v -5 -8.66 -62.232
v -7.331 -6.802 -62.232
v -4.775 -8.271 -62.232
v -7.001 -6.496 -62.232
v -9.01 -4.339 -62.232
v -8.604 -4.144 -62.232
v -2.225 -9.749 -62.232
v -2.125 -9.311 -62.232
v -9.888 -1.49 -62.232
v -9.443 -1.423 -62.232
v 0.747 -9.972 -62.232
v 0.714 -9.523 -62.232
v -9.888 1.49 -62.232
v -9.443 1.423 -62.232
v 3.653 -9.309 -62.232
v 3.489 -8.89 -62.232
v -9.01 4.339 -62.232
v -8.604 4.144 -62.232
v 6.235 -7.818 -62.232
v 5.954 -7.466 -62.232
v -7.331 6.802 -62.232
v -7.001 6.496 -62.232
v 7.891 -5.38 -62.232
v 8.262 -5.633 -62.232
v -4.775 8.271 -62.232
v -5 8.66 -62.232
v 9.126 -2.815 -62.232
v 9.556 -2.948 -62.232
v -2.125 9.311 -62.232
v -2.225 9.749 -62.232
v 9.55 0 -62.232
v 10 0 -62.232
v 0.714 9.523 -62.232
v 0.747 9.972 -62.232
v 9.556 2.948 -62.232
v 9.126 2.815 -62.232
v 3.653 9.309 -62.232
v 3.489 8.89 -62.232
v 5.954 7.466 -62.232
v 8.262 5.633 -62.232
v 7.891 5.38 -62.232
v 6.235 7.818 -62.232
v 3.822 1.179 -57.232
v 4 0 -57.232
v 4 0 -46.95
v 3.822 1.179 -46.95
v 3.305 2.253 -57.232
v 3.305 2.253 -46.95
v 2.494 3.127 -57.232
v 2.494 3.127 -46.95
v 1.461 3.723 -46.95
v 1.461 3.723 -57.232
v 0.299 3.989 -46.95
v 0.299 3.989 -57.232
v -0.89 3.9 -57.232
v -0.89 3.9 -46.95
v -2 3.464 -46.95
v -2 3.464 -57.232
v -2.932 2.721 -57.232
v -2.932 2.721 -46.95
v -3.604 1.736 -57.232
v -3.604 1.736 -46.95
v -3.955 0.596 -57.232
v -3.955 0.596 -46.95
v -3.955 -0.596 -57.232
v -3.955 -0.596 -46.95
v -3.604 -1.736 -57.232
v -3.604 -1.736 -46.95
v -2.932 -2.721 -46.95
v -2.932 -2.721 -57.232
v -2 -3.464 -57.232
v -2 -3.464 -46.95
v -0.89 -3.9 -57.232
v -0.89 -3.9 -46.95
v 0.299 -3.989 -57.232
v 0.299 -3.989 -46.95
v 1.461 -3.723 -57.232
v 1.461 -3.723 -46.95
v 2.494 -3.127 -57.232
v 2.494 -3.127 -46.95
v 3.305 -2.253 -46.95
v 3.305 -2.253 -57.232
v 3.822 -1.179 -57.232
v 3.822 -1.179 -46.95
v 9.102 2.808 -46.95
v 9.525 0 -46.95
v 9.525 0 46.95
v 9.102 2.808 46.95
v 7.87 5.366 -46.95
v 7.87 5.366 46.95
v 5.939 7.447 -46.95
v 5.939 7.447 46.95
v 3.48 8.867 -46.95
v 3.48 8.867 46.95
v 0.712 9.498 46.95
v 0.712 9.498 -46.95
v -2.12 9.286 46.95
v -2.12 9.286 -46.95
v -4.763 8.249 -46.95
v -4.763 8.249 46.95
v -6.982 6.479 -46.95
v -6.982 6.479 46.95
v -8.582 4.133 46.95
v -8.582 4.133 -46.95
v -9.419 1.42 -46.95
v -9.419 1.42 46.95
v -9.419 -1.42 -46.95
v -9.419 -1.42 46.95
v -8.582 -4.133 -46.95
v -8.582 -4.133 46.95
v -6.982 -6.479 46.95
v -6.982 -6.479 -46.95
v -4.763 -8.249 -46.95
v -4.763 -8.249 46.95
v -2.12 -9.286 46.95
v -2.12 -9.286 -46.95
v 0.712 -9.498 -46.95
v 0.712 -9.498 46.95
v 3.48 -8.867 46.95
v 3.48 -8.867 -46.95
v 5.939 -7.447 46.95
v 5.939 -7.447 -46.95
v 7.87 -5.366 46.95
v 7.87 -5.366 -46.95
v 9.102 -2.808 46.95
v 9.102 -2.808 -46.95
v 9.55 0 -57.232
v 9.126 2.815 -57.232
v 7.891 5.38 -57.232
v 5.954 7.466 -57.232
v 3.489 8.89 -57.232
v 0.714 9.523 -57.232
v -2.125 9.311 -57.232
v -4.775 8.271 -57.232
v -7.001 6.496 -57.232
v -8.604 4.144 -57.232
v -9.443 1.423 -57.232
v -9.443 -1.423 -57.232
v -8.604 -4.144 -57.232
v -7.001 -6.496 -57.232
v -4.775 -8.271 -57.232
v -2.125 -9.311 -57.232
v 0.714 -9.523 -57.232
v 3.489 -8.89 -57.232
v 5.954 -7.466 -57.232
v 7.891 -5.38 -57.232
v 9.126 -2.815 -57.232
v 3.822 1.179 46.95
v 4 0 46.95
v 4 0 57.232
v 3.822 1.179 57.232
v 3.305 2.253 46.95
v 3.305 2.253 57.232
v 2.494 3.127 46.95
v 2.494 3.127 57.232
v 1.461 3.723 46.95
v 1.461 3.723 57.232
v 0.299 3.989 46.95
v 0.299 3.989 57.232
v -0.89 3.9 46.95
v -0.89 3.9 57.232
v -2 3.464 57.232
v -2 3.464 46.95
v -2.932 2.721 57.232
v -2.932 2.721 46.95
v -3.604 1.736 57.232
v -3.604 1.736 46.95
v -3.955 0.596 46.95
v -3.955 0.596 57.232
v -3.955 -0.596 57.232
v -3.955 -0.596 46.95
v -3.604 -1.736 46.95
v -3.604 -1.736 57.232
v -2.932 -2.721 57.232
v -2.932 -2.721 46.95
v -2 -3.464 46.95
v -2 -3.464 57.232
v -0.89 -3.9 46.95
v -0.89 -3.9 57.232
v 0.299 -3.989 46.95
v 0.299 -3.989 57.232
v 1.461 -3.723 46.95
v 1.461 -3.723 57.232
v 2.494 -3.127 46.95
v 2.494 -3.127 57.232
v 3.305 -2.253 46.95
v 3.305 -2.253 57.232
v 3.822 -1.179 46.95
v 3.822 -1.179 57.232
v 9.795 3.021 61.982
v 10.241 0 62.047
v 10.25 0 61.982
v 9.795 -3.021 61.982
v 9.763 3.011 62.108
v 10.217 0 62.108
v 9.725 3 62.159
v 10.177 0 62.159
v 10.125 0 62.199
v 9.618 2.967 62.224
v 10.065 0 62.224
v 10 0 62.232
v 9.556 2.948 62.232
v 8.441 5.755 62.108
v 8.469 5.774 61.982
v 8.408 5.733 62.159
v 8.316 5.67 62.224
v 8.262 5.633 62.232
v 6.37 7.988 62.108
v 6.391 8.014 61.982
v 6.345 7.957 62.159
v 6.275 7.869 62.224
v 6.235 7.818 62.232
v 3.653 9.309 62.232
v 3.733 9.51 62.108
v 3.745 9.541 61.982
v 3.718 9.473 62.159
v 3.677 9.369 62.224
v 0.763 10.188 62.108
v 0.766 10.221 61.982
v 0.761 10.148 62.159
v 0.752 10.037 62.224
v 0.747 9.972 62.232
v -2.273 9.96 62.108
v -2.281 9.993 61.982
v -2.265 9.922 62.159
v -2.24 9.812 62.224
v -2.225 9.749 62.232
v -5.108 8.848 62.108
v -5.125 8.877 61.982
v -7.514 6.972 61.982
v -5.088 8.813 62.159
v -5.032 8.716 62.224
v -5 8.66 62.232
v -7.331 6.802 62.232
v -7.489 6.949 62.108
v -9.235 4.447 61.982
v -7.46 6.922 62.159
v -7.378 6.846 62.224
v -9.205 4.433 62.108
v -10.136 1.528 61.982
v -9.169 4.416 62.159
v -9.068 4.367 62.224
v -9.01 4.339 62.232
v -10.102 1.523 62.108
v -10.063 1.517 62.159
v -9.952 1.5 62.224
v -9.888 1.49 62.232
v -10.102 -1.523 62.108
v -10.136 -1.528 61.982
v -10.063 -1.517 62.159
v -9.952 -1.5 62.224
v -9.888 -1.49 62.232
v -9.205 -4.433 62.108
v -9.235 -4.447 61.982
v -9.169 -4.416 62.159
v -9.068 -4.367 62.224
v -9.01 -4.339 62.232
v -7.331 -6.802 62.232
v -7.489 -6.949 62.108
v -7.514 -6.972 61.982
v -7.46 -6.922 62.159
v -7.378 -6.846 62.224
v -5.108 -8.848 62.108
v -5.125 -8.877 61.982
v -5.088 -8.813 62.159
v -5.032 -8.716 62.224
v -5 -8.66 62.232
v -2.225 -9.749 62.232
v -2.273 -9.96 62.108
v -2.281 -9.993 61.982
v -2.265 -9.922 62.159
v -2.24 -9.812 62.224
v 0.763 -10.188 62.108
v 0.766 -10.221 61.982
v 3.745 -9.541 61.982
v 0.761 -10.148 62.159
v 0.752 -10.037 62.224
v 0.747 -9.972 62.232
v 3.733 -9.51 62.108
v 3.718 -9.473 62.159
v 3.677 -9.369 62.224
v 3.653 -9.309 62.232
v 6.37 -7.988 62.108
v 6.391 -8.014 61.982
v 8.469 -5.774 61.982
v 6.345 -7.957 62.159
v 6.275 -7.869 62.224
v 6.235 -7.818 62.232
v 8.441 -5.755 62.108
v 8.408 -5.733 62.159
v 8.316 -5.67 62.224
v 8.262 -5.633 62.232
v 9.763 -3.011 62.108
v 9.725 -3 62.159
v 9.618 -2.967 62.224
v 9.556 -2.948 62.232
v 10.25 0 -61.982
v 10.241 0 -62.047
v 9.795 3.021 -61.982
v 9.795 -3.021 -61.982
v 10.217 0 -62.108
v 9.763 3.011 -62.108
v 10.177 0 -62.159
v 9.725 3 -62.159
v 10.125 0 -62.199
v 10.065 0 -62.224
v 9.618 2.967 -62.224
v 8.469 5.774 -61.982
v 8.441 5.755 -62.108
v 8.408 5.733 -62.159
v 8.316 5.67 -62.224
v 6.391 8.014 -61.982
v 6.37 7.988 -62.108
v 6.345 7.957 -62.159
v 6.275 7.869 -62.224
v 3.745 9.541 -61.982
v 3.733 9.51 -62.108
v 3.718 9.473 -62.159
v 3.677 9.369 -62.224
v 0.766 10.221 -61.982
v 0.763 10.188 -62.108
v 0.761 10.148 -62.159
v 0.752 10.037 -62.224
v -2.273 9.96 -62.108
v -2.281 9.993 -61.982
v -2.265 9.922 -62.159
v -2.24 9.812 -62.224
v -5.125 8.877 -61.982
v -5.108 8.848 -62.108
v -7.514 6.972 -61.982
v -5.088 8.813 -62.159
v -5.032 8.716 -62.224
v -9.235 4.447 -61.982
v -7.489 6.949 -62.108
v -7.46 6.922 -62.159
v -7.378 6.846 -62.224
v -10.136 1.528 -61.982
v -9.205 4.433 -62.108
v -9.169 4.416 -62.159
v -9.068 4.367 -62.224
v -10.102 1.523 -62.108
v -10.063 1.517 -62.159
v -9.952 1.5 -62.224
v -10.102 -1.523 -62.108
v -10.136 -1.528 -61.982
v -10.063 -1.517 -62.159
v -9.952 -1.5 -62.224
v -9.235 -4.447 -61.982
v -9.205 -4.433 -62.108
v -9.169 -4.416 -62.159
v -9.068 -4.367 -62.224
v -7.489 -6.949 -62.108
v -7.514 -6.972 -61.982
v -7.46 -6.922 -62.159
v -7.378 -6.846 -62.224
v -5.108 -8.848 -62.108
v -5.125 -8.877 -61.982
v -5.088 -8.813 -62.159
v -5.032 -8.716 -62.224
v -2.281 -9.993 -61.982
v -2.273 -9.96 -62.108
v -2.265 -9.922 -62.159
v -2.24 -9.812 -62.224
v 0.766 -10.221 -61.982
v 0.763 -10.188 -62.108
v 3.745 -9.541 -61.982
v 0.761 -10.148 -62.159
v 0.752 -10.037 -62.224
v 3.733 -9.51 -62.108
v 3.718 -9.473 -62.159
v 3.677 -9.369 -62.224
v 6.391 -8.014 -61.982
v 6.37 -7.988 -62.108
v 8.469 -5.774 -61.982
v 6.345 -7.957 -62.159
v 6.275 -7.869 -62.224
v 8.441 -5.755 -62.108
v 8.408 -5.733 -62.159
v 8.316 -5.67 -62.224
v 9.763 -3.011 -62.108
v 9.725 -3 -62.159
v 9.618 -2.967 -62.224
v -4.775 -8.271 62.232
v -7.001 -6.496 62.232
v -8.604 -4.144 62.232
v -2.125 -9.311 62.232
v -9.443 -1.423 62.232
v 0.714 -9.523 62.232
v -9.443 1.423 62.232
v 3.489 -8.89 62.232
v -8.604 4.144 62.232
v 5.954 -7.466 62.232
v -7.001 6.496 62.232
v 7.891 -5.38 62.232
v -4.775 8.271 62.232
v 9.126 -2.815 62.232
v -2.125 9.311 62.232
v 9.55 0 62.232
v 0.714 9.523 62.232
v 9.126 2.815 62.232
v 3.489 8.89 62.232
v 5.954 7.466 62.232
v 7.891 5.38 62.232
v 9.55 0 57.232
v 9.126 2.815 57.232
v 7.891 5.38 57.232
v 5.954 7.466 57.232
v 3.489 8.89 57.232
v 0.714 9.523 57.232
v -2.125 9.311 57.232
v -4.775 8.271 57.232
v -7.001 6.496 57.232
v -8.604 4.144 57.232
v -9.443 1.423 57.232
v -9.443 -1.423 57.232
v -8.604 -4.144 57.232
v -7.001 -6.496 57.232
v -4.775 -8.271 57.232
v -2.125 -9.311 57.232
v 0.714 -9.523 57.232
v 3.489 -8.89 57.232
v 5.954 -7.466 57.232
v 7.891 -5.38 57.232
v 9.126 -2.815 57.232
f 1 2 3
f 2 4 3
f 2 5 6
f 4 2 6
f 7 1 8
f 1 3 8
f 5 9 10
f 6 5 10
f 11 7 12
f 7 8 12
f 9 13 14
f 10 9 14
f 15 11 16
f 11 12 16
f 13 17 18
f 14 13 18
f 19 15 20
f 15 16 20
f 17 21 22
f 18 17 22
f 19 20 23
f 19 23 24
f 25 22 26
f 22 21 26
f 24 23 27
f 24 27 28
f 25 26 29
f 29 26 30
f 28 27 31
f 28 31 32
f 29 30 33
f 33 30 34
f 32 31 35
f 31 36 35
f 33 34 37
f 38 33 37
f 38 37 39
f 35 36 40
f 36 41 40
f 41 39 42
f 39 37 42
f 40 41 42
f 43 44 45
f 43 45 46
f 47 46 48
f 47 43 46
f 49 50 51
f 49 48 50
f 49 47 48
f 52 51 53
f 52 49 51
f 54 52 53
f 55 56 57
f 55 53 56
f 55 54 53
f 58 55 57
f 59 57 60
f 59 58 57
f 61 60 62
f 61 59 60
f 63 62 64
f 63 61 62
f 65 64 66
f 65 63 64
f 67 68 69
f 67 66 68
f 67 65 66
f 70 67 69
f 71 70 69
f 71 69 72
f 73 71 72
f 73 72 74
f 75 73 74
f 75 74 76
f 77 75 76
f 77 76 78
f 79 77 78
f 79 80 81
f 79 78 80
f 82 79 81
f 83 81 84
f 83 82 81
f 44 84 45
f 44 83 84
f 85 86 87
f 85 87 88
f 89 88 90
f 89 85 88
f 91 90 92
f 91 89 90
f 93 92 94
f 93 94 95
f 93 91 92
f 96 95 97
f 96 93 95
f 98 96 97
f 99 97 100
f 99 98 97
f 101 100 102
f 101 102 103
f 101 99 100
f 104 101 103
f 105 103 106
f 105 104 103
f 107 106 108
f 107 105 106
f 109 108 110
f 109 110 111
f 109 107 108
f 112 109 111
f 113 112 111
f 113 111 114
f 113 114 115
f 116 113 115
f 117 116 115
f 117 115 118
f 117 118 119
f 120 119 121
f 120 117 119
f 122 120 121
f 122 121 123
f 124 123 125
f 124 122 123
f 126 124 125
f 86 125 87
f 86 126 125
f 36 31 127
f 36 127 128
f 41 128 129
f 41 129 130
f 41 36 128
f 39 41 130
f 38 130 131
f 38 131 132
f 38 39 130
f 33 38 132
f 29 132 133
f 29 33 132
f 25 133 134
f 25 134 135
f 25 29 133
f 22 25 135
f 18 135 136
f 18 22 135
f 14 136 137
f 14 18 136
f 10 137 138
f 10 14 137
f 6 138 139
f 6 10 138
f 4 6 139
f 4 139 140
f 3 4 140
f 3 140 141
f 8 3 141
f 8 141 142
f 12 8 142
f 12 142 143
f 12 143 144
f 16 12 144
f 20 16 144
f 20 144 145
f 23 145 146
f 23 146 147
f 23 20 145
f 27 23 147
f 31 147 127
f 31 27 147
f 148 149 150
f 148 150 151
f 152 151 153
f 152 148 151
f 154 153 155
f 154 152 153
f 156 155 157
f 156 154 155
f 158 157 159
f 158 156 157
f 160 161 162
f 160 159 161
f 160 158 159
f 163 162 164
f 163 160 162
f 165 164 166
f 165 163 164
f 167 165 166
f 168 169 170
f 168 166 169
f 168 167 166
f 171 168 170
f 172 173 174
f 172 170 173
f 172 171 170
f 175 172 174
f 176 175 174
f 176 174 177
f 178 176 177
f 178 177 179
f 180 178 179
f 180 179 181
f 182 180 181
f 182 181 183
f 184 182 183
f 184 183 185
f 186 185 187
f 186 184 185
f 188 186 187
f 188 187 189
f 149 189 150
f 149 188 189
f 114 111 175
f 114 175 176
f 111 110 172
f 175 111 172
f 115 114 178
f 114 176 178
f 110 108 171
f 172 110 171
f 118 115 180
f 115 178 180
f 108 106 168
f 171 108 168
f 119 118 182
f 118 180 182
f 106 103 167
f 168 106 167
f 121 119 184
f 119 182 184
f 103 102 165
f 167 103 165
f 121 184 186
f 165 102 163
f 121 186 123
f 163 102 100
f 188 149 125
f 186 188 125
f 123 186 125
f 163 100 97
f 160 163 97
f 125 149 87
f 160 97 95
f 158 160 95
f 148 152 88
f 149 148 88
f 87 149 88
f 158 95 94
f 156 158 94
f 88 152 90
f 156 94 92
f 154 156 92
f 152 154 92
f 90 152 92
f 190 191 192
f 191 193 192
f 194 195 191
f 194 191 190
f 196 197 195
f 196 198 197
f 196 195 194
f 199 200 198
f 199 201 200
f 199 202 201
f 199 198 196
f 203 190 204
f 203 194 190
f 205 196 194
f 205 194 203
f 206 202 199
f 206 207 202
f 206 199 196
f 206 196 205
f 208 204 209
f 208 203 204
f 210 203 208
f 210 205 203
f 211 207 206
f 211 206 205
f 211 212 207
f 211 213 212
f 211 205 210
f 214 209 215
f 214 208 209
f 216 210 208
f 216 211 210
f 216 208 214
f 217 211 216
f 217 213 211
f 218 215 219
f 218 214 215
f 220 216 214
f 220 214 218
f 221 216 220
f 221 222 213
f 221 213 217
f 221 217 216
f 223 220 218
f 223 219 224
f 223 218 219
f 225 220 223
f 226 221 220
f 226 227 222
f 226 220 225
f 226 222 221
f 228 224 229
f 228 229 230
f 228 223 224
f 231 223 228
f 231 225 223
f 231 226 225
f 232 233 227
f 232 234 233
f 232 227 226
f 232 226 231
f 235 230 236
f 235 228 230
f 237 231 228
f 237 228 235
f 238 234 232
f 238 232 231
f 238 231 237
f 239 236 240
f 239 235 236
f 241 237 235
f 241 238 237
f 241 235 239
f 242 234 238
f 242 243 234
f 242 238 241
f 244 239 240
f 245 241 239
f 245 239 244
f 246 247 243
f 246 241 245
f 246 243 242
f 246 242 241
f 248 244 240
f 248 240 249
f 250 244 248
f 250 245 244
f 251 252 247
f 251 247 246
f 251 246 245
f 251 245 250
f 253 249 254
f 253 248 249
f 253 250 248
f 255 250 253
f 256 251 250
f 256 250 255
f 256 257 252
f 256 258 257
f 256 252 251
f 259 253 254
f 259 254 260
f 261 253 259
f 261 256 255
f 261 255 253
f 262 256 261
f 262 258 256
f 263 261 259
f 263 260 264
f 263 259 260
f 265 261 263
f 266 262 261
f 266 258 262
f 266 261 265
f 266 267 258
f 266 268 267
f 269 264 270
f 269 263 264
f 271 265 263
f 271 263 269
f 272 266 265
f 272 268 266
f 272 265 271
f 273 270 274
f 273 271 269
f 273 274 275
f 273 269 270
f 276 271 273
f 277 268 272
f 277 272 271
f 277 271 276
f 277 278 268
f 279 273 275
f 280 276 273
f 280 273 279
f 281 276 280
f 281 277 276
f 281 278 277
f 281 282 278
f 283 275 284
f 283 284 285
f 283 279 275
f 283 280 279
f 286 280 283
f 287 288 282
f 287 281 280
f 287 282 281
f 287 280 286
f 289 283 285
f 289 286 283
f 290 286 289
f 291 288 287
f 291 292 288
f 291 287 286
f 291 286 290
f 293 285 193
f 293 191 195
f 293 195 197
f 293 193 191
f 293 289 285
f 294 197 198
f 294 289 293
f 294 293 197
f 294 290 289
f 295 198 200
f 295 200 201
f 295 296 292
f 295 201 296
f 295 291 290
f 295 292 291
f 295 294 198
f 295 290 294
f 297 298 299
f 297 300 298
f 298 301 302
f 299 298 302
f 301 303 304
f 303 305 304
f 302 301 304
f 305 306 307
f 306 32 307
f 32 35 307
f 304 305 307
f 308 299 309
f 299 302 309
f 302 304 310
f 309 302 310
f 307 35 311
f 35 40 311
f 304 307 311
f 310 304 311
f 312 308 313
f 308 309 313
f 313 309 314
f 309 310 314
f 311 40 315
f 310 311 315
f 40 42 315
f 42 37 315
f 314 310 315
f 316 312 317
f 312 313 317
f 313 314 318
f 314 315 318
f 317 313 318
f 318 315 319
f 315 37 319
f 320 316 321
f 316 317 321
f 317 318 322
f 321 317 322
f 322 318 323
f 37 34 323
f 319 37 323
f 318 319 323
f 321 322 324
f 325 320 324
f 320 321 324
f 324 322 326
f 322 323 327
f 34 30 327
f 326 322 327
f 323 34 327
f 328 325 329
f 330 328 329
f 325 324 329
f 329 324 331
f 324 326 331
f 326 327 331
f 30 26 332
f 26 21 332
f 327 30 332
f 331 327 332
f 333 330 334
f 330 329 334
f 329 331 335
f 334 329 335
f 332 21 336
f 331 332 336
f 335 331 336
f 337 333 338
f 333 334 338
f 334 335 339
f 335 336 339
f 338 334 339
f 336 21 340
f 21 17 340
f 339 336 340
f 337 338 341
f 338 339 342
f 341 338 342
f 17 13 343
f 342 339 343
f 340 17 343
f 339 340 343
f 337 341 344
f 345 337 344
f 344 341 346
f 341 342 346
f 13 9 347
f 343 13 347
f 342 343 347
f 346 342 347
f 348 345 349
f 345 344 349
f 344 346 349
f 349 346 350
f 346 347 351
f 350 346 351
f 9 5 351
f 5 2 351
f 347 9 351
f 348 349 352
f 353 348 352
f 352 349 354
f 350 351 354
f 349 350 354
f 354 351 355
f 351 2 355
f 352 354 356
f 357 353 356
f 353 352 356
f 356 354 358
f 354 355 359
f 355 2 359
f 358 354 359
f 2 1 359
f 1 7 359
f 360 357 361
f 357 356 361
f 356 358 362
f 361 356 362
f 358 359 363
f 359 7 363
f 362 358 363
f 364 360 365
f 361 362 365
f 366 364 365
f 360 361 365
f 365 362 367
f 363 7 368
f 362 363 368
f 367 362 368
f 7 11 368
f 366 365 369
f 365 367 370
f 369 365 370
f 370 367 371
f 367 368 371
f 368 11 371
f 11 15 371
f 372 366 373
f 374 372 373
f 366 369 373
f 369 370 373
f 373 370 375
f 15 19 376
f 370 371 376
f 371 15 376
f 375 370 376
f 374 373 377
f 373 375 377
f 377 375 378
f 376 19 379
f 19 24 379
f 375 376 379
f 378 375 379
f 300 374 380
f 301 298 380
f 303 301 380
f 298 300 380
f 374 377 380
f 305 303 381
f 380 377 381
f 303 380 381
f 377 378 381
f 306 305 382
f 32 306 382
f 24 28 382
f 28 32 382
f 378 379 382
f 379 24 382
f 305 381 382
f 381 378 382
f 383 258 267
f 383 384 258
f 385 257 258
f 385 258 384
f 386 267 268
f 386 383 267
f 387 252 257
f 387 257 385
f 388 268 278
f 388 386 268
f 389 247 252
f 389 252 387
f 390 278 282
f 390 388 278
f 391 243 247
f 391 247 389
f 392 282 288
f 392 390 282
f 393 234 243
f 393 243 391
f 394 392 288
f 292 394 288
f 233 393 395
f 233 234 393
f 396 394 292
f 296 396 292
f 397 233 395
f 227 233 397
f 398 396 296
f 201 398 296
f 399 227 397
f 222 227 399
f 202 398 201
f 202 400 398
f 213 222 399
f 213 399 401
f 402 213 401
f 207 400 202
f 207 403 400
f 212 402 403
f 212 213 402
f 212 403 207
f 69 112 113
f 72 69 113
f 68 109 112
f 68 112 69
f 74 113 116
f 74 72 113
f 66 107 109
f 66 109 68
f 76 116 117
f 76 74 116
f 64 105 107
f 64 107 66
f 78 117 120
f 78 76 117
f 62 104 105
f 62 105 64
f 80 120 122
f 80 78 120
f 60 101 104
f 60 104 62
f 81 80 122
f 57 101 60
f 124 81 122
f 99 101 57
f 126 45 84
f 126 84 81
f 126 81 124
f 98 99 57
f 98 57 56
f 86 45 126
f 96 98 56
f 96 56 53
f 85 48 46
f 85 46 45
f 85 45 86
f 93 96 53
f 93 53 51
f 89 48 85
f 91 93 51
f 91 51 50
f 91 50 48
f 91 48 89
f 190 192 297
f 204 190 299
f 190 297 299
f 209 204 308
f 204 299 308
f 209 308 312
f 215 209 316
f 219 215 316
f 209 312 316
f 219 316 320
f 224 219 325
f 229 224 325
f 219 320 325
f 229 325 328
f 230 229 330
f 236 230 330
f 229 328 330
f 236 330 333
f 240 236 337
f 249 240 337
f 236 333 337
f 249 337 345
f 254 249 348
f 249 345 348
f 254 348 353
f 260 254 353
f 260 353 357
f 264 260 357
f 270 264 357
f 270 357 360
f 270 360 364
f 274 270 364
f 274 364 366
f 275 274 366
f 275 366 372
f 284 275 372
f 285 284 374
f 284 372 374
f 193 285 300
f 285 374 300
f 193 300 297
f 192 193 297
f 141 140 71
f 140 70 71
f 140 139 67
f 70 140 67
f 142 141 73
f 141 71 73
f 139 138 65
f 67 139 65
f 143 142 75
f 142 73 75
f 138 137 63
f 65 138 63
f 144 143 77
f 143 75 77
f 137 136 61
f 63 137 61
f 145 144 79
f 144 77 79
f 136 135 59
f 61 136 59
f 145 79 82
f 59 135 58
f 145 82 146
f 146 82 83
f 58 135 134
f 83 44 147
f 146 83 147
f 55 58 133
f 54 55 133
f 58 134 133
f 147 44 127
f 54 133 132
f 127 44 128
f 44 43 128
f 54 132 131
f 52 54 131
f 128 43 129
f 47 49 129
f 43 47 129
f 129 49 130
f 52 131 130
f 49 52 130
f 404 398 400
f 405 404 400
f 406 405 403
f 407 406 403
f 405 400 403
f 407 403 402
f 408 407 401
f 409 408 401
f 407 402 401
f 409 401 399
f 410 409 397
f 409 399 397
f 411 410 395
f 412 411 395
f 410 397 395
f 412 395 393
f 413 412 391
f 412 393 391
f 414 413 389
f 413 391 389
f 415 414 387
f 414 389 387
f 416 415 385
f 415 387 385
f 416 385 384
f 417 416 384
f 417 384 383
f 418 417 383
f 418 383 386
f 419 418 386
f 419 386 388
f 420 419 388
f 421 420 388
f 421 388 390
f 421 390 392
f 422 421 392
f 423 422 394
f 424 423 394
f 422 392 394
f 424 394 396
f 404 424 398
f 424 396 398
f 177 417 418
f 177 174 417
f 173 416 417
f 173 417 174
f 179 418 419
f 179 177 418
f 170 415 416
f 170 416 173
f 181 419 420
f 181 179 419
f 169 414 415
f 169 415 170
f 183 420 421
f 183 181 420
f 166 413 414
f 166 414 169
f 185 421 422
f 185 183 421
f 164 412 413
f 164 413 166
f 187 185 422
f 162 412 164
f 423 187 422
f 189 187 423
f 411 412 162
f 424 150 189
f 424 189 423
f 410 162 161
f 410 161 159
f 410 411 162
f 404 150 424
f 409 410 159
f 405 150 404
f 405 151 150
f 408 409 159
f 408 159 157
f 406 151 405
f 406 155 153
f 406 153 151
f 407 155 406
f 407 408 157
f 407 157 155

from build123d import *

# Parameters (mm, degrees)
BASE_EXTRUDE_DEPTH      = 62.2325
BASE_EXTRUDE_DEPTH_BACK = 62.2325
SKETCH1_R               = 10.25
STROKECHAMBER_START     = -46.95
SKETCH2_R               = 9.525
STROKECHAMBER_DEPTH     = 93.9
RODBORE_DEPTH           = 64.898427651
RODBORE_DEPTH_BACK      = 64.898427651
SKETCH3_R               = 4
FILLET1_R               = 0.25
SKETCH4_R               = 9.55
CUT_EXTRUDE1_DEPTH      = 5


with BuildPart() as part:
    # Sketch1 → Base-Extrude (new, two sides: drawn at the far end of the back side and taken through both)
    with BuildSketch(Plane.XY.offset(-BASE_EXTRUDE_DEPTH_BACK)):
        Circle(SKETCH1_R)
    extrude(amount=BASE_EXTRUDE_DEPTH + BASE_EXTRUDE_DEPTH_BACK)

    # Sketch2 → StrokeChamber (cut)
    with BuildSketch(Plane.XY.offset(STROKECHAMBER_START)):
        Circle(SKETCH2_R)
    extrude(amount=STROKECHAMBER_DEPTH, mode=Mode.SUBTRACT)

    # Sketch3 → RodBore (cut, two sides: drawn at the far end of the back side and taken through both)
    with BuildSketch(Plane.XY.offset(-RODBORE_DEPTH_BACK)):
        Circle(SKETCH3_R)
    extrude(amount=RODBORE_DEPTH + RODBORE_DEPTH_BACK, mode=Mode.SUBTRACT)

    # Fillet1
    fillet1_edges = [part.edges().sort_by_distance(p)[0] for p in [
        (-10.25, 0, -62.2325),
        (-10.25, 0, 62.2325),
    ]]
    fillet(fillet1_edges, radius=FILLET1_R)

    # Sketch4 → Cut-Extrude1 (cut)
    with BuildSketch(Plane.XY.offset(62.2325)):
        Circle(SKETCH4_R)
    cut_extrude1 = extrude(amount=-CUT_EXTRUDE1_DEPTH, mode=Mode.SUBTRACT)

    # Mirror1: Cut-Extrude1 across plane
    add(cut_extrude1.mirror(Plane.XY), mode=Mode.SUBTRACT)


solid = part.part
